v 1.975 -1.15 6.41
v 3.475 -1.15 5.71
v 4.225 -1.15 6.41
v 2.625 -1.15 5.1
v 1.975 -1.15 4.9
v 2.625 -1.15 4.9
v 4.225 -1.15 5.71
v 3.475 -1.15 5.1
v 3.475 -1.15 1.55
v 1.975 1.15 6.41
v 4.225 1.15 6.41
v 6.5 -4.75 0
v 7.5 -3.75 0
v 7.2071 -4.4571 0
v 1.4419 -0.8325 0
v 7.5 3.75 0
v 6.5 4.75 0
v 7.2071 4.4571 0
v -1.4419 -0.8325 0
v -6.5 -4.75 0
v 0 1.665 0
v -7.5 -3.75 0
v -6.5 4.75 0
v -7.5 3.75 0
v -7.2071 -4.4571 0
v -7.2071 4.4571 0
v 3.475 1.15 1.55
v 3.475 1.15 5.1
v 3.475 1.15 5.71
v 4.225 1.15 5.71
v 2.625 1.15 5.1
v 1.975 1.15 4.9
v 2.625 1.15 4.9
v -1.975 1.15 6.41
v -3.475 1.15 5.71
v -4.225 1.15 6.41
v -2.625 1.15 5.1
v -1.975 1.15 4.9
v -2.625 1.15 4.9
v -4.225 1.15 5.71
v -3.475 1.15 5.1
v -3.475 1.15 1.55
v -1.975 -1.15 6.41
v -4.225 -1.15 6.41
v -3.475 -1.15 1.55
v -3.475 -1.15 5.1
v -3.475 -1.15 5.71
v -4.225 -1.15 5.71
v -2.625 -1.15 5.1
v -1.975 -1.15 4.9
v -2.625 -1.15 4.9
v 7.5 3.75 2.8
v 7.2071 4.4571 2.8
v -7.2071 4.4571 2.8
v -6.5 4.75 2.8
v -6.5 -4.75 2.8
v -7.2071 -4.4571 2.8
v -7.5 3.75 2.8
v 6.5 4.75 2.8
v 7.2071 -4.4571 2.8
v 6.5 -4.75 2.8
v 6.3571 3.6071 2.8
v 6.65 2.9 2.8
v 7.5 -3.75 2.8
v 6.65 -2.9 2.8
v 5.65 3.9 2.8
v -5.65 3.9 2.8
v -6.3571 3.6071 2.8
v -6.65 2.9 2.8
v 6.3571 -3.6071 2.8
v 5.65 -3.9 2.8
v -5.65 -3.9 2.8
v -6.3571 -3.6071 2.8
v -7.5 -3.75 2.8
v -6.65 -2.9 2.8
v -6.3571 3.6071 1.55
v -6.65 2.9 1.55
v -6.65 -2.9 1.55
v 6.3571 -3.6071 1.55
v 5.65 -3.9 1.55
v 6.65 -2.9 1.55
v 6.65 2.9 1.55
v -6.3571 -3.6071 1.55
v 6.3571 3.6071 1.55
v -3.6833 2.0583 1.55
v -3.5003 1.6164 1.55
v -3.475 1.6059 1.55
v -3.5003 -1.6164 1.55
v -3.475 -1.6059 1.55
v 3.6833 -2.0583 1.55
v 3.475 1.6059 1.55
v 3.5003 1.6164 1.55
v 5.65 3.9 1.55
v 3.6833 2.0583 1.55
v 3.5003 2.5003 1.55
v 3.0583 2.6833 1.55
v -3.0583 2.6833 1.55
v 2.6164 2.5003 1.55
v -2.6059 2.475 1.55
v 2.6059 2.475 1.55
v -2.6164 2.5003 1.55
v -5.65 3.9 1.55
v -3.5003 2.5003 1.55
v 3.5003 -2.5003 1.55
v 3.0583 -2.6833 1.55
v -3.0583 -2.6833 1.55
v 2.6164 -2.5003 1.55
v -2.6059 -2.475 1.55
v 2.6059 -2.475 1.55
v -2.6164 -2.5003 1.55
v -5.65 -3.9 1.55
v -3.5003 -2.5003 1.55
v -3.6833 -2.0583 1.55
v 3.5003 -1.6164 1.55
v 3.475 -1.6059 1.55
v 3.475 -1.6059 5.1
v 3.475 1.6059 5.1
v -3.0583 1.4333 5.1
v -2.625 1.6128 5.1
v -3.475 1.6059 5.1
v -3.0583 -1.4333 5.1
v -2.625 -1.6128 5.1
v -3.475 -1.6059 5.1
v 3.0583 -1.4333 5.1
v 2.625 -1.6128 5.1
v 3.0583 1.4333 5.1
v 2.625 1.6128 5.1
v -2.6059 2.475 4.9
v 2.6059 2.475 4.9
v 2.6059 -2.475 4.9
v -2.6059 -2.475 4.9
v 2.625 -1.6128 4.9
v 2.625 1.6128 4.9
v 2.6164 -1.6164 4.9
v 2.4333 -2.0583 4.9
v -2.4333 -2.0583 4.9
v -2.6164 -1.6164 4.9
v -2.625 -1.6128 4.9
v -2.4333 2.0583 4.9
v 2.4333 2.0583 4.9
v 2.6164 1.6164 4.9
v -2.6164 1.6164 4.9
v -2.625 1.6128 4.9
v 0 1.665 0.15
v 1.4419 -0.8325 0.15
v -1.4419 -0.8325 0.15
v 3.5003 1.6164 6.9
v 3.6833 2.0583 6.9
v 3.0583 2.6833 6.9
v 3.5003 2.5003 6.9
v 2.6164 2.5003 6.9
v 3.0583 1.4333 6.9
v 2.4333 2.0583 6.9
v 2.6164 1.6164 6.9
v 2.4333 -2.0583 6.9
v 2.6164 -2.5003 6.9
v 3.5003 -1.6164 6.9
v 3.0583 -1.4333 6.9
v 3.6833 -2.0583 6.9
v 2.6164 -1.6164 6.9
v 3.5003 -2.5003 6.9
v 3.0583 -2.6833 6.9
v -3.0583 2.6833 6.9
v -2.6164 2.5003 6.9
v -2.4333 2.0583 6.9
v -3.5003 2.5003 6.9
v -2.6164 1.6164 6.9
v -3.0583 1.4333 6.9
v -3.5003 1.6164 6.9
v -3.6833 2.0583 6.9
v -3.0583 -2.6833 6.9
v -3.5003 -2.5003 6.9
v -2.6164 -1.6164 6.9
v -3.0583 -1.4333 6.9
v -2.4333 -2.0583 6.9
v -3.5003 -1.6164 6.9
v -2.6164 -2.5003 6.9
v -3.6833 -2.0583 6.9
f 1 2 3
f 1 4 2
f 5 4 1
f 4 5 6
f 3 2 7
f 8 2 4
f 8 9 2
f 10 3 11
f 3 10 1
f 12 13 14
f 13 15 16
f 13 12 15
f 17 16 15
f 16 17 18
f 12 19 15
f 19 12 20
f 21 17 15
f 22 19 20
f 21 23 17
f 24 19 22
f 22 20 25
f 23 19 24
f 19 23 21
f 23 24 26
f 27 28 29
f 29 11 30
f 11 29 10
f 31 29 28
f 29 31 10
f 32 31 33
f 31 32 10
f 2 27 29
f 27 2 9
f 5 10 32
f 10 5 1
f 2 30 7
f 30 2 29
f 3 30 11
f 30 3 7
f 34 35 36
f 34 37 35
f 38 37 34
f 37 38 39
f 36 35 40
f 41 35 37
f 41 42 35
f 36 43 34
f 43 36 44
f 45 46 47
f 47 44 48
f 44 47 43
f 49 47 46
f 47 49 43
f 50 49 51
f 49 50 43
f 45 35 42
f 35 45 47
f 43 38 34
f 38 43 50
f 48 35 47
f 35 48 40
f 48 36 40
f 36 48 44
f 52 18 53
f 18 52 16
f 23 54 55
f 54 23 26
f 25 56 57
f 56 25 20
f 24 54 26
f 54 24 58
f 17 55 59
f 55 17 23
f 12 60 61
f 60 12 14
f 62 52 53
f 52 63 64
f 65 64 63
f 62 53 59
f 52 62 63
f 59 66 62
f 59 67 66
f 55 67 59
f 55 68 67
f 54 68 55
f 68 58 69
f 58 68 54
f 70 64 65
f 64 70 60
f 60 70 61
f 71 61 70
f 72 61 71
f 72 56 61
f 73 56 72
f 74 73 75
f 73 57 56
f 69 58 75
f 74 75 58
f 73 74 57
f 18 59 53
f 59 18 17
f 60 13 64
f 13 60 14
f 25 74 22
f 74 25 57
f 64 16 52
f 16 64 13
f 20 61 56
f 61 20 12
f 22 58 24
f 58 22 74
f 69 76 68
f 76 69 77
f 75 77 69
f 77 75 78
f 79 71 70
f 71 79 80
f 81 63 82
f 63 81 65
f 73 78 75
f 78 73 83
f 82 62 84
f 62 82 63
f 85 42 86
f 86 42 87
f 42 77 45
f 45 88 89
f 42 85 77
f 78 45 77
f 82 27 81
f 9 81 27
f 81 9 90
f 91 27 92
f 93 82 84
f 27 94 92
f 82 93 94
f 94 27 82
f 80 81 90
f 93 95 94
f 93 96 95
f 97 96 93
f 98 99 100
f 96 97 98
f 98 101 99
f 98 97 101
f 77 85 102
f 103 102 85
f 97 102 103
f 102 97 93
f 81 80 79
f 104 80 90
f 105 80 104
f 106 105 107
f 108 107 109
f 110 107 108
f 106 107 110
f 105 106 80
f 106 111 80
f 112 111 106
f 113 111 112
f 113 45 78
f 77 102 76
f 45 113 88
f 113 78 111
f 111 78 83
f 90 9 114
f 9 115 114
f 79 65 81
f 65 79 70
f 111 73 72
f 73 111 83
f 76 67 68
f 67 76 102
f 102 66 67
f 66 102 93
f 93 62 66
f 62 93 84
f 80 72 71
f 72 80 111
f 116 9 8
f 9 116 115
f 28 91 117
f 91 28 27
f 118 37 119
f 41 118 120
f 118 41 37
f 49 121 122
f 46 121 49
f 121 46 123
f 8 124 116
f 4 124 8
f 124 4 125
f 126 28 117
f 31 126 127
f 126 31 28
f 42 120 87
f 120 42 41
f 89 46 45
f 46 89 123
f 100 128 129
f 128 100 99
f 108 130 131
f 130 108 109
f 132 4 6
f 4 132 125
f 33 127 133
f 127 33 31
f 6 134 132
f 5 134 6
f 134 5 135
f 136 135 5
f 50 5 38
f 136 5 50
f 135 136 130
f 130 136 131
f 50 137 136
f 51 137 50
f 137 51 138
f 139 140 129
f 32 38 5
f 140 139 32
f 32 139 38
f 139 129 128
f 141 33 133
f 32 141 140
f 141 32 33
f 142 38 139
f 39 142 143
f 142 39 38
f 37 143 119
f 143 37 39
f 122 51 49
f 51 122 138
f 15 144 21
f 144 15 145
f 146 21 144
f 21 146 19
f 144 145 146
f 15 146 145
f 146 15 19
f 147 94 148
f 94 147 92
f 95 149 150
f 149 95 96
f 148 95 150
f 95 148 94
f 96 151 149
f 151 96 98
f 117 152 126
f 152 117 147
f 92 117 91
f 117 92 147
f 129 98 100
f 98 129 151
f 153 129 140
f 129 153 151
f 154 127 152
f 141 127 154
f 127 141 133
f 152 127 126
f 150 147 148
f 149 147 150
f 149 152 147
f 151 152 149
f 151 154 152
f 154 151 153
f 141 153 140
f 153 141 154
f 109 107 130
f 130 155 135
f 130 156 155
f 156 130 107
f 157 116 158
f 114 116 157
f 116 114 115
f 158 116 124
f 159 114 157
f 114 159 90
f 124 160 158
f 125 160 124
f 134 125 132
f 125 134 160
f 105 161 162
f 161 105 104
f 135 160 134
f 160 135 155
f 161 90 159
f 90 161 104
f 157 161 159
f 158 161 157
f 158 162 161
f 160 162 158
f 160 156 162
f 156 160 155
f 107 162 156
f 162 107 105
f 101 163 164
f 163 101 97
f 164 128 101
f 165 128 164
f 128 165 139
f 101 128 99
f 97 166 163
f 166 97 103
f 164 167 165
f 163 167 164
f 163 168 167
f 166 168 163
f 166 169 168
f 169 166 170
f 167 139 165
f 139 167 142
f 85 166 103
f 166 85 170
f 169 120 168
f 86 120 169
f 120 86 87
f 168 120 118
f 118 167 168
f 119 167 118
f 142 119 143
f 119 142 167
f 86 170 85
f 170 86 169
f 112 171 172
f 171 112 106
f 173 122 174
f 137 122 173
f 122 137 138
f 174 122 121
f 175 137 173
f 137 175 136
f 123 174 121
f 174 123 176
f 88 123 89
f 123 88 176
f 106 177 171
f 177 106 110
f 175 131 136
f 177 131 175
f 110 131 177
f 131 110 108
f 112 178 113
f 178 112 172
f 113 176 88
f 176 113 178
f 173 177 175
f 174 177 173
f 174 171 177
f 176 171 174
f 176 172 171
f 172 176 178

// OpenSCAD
// file: mcad/boxes.scad
// Library: boxes.scad
// Version: 1.0
// Author: Marius Kintel
// Copyright: 2010
// License: BSD

// roundedBox([width, height, depth], float radius, bool sidesonly);

// EXAMPLE USAGE:
// roundedBox([20, 30, 40], 5, true);

// size is a vector [w, h, d]
module roundedBox(size, radius, sidesonly)
{
  off=[size[0]/2-radius, size[1]/2-radius, size[2]/2-radius];
  hull()
  if (sidesonly) {
    for(x=[-1,1], y=[-1,1])
    translate([x*off[0], y*off[1], 0])
    cylinder(r=radius, h=size[2], center=true);
  } else {
    for(x=[-1,1], y=[-1,1], z=[-1,1])
    translate([x*off[0], y*off[1], z*off[2]])
    sphere(r=radius);
  }
}
// main file
$fn = 8;
include  <mcad/boxes.scad>;

// editable variables
keywidth = 15;
keydepth = 9.5;
basewidth = 7.4 -.45;
basedepth = 5.4 -.45;

//static variables
keyheight = 2.8;
borderinset = 1.55;
borderthickness = 0.85;
baseheight = 5.1;
basecutoutwidth = 5.25;
basecutoutdepth = basedepth;
basecutoutheight = .2;
baseclipwidth = 2.3;
baseclipdepth = 1.5;
baseclipheight = 6.41;
postdiameter = 1.25;
postheight = 6.9;
cornerdiameter = 1;

//main
base_keyclips();
difference(){
    union(){
    keytop();
    keybase();
    }
label();
}
base_cornerposts();


module keytop() {
    difference() {
        keytopstock();
        translate([0,0,borderinset])
        border_cutout();
    }
}
module keytopstock() {
        translate([0, 0, keyheight/2])
        roundedBox([keywidth,keydepth,keyheight],cornerdiameter, true);
}

module border_cutout() {
    translate([0, 0, borderinset/2])
    roundedBox([keywidth-borderthickness*2,keydepth-borderthickness*2,borderinset], cornerdiameter, true);
}

module keybase() {
        difference() {
            base_stock();
            translate([0,0,basecutoutheight])
            base_cutout();
        }
}

module base_stock() { 
    translate([0, 0, baseheight/2])
    cube([basewidth,basedepth,baseheight],true);
}

module base_cutout() {
    translate([0,0, baseheight-(1.5*basecutoutheight)])
    cube([basecutoutwidth, basecutoutdepth, basecutoutheight], true);
}

module base_keyclip() {
    rotate([0,0,270]){
    translate([0,0,baseclipheight/2]){
    cube([baseclipwidth,baseclipdepth,baseclipheight], true);
    }
    translate([0,baseclipdepth/2,baseclipheight-.35]){
    cube([baseclipwidth,1.5,.7], true);}}
}


module base_keyclips() {
    translate([basewidth/2-baseclipdepth/2, 0, 0]){
    base_keyclip();}
    rotate([0,0,180]){translate([basewidth/2-baseclipdepth/2, 0, 0]){
    base_keyclip();}}
}

/*
module base_keyclip() {
    rotate([0,0,270]){
    translate([0,0,baseclipheight/2]){
    cube([baseclipwidth,baseclipdepth,baseclipheight], true);
    }
    translate([0,baseclipdepth/2,baseclipheight-.8]){
    rotate([90,0,90]){cylinder(h=baseclipwidth, d=1.6, center =true);}}
}
}


module base_keyclip() {
    translate([0,0,baseclipheight/2]){
    cube([baseclipwidth,baseclipdepth,baseclipheight], true);
    }
    translate([0,baseclipwidth/2,baseclipheight-.76]){
    difference() {
        rotate([90,0,90]){
        cylinder(h=baseclipwidth, d=1.52,$fn=3, true);
        }
        translate([0,0,-.76/2]){
        cube([baseclipwidth,10,.76], true);
        }
    }
    }
}*/


module base_single_cornerpost() {
    cylinder(h=postheight, d=postdiameter, center=true);
}

module base_cornerposts() {
    post_offset = postdiameter/3;
    translate([basewidth/2-post_offset, basedepth/2-post_offset, postheight/2]){
    base_single_cornerpost();
    }
    translate([basewidth/2-post_offset, -basedepth/2+post_offset, postheight/2]){
    base_single_cornerpost();
    }
    translate([-basewidth/2+post_offset, basedepth/2-post_offset, postheight/2]){
    base_single_cornerpost();
    }
    translate([-basewidth/2+post_offset, -basedepth/2+post_offset, postheight/2]){
    base_single_cornerpost();
    }
}

module label() {
    rotate([0,0,90]){cylinder(h=.3, d=3.33,$fn=3, center=true);
    }
}
